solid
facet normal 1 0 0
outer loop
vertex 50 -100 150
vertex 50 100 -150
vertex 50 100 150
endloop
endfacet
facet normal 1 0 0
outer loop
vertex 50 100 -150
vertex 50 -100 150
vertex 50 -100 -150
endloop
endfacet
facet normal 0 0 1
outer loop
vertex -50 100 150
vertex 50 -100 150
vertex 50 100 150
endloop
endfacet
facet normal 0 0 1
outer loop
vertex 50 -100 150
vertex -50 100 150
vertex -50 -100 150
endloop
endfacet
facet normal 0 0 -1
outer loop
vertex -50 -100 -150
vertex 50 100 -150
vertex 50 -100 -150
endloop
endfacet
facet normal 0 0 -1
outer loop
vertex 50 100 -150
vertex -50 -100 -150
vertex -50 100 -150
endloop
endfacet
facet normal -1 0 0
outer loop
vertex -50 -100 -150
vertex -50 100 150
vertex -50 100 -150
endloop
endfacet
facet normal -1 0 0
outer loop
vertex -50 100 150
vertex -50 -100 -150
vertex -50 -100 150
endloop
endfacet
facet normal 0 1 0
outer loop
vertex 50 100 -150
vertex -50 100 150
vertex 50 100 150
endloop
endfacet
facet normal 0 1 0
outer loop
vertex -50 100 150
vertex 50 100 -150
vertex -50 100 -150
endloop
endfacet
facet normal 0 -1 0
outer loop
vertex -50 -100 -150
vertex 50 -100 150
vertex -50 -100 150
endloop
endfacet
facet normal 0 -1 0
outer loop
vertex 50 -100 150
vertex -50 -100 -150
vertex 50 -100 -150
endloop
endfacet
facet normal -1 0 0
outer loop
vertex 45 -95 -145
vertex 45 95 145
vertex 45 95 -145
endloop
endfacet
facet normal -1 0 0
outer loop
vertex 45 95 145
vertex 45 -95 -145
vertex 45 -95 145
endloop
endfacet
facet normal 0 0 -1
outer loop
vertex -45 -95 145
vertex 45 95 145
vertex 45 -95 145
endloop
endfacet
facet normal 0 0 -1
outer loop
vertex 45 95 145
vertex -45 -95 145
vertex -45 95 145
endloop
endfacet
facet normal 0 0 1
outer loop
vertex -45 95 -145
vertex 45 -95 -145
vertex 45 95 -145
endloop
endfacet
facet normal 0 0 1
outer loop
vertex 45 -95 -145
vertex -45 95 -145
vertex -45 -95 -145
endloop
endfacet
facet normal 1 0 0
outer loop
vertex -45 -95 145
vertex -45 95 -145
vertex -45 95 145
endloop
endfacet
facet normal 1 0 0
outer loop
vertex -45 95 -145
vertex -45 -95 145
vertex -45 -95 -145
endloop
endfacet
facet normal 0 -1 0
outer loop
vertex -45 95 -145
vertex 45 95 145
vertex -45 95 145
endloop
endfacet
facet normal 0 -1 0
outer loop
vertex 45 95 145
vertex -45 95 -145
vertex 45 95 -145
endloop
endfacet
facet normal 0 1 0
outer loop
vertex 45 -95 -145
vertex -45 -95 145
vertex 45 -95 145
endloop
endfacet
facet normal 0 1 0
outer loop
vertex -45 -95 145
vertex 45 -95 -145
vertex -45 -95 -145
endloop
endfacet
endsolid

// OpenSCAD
// include <../../config.scad>;

module hollow_cuboid(R, t) {
    difference() {
        cube(R, center = true);
        cube([R[0] - t * 2, R[1] - t * 2, R[2] - t * 2], center = true);
    }
    // Shopping
    echo(str("Hollow cuboid: Hollow cuboid ", R[0], "mm x ", R[1], "mm x ", R[2], "mm x ", R[3], "mm - x1"));
}

hollow_cuboid([100, 200, 300], 5);
